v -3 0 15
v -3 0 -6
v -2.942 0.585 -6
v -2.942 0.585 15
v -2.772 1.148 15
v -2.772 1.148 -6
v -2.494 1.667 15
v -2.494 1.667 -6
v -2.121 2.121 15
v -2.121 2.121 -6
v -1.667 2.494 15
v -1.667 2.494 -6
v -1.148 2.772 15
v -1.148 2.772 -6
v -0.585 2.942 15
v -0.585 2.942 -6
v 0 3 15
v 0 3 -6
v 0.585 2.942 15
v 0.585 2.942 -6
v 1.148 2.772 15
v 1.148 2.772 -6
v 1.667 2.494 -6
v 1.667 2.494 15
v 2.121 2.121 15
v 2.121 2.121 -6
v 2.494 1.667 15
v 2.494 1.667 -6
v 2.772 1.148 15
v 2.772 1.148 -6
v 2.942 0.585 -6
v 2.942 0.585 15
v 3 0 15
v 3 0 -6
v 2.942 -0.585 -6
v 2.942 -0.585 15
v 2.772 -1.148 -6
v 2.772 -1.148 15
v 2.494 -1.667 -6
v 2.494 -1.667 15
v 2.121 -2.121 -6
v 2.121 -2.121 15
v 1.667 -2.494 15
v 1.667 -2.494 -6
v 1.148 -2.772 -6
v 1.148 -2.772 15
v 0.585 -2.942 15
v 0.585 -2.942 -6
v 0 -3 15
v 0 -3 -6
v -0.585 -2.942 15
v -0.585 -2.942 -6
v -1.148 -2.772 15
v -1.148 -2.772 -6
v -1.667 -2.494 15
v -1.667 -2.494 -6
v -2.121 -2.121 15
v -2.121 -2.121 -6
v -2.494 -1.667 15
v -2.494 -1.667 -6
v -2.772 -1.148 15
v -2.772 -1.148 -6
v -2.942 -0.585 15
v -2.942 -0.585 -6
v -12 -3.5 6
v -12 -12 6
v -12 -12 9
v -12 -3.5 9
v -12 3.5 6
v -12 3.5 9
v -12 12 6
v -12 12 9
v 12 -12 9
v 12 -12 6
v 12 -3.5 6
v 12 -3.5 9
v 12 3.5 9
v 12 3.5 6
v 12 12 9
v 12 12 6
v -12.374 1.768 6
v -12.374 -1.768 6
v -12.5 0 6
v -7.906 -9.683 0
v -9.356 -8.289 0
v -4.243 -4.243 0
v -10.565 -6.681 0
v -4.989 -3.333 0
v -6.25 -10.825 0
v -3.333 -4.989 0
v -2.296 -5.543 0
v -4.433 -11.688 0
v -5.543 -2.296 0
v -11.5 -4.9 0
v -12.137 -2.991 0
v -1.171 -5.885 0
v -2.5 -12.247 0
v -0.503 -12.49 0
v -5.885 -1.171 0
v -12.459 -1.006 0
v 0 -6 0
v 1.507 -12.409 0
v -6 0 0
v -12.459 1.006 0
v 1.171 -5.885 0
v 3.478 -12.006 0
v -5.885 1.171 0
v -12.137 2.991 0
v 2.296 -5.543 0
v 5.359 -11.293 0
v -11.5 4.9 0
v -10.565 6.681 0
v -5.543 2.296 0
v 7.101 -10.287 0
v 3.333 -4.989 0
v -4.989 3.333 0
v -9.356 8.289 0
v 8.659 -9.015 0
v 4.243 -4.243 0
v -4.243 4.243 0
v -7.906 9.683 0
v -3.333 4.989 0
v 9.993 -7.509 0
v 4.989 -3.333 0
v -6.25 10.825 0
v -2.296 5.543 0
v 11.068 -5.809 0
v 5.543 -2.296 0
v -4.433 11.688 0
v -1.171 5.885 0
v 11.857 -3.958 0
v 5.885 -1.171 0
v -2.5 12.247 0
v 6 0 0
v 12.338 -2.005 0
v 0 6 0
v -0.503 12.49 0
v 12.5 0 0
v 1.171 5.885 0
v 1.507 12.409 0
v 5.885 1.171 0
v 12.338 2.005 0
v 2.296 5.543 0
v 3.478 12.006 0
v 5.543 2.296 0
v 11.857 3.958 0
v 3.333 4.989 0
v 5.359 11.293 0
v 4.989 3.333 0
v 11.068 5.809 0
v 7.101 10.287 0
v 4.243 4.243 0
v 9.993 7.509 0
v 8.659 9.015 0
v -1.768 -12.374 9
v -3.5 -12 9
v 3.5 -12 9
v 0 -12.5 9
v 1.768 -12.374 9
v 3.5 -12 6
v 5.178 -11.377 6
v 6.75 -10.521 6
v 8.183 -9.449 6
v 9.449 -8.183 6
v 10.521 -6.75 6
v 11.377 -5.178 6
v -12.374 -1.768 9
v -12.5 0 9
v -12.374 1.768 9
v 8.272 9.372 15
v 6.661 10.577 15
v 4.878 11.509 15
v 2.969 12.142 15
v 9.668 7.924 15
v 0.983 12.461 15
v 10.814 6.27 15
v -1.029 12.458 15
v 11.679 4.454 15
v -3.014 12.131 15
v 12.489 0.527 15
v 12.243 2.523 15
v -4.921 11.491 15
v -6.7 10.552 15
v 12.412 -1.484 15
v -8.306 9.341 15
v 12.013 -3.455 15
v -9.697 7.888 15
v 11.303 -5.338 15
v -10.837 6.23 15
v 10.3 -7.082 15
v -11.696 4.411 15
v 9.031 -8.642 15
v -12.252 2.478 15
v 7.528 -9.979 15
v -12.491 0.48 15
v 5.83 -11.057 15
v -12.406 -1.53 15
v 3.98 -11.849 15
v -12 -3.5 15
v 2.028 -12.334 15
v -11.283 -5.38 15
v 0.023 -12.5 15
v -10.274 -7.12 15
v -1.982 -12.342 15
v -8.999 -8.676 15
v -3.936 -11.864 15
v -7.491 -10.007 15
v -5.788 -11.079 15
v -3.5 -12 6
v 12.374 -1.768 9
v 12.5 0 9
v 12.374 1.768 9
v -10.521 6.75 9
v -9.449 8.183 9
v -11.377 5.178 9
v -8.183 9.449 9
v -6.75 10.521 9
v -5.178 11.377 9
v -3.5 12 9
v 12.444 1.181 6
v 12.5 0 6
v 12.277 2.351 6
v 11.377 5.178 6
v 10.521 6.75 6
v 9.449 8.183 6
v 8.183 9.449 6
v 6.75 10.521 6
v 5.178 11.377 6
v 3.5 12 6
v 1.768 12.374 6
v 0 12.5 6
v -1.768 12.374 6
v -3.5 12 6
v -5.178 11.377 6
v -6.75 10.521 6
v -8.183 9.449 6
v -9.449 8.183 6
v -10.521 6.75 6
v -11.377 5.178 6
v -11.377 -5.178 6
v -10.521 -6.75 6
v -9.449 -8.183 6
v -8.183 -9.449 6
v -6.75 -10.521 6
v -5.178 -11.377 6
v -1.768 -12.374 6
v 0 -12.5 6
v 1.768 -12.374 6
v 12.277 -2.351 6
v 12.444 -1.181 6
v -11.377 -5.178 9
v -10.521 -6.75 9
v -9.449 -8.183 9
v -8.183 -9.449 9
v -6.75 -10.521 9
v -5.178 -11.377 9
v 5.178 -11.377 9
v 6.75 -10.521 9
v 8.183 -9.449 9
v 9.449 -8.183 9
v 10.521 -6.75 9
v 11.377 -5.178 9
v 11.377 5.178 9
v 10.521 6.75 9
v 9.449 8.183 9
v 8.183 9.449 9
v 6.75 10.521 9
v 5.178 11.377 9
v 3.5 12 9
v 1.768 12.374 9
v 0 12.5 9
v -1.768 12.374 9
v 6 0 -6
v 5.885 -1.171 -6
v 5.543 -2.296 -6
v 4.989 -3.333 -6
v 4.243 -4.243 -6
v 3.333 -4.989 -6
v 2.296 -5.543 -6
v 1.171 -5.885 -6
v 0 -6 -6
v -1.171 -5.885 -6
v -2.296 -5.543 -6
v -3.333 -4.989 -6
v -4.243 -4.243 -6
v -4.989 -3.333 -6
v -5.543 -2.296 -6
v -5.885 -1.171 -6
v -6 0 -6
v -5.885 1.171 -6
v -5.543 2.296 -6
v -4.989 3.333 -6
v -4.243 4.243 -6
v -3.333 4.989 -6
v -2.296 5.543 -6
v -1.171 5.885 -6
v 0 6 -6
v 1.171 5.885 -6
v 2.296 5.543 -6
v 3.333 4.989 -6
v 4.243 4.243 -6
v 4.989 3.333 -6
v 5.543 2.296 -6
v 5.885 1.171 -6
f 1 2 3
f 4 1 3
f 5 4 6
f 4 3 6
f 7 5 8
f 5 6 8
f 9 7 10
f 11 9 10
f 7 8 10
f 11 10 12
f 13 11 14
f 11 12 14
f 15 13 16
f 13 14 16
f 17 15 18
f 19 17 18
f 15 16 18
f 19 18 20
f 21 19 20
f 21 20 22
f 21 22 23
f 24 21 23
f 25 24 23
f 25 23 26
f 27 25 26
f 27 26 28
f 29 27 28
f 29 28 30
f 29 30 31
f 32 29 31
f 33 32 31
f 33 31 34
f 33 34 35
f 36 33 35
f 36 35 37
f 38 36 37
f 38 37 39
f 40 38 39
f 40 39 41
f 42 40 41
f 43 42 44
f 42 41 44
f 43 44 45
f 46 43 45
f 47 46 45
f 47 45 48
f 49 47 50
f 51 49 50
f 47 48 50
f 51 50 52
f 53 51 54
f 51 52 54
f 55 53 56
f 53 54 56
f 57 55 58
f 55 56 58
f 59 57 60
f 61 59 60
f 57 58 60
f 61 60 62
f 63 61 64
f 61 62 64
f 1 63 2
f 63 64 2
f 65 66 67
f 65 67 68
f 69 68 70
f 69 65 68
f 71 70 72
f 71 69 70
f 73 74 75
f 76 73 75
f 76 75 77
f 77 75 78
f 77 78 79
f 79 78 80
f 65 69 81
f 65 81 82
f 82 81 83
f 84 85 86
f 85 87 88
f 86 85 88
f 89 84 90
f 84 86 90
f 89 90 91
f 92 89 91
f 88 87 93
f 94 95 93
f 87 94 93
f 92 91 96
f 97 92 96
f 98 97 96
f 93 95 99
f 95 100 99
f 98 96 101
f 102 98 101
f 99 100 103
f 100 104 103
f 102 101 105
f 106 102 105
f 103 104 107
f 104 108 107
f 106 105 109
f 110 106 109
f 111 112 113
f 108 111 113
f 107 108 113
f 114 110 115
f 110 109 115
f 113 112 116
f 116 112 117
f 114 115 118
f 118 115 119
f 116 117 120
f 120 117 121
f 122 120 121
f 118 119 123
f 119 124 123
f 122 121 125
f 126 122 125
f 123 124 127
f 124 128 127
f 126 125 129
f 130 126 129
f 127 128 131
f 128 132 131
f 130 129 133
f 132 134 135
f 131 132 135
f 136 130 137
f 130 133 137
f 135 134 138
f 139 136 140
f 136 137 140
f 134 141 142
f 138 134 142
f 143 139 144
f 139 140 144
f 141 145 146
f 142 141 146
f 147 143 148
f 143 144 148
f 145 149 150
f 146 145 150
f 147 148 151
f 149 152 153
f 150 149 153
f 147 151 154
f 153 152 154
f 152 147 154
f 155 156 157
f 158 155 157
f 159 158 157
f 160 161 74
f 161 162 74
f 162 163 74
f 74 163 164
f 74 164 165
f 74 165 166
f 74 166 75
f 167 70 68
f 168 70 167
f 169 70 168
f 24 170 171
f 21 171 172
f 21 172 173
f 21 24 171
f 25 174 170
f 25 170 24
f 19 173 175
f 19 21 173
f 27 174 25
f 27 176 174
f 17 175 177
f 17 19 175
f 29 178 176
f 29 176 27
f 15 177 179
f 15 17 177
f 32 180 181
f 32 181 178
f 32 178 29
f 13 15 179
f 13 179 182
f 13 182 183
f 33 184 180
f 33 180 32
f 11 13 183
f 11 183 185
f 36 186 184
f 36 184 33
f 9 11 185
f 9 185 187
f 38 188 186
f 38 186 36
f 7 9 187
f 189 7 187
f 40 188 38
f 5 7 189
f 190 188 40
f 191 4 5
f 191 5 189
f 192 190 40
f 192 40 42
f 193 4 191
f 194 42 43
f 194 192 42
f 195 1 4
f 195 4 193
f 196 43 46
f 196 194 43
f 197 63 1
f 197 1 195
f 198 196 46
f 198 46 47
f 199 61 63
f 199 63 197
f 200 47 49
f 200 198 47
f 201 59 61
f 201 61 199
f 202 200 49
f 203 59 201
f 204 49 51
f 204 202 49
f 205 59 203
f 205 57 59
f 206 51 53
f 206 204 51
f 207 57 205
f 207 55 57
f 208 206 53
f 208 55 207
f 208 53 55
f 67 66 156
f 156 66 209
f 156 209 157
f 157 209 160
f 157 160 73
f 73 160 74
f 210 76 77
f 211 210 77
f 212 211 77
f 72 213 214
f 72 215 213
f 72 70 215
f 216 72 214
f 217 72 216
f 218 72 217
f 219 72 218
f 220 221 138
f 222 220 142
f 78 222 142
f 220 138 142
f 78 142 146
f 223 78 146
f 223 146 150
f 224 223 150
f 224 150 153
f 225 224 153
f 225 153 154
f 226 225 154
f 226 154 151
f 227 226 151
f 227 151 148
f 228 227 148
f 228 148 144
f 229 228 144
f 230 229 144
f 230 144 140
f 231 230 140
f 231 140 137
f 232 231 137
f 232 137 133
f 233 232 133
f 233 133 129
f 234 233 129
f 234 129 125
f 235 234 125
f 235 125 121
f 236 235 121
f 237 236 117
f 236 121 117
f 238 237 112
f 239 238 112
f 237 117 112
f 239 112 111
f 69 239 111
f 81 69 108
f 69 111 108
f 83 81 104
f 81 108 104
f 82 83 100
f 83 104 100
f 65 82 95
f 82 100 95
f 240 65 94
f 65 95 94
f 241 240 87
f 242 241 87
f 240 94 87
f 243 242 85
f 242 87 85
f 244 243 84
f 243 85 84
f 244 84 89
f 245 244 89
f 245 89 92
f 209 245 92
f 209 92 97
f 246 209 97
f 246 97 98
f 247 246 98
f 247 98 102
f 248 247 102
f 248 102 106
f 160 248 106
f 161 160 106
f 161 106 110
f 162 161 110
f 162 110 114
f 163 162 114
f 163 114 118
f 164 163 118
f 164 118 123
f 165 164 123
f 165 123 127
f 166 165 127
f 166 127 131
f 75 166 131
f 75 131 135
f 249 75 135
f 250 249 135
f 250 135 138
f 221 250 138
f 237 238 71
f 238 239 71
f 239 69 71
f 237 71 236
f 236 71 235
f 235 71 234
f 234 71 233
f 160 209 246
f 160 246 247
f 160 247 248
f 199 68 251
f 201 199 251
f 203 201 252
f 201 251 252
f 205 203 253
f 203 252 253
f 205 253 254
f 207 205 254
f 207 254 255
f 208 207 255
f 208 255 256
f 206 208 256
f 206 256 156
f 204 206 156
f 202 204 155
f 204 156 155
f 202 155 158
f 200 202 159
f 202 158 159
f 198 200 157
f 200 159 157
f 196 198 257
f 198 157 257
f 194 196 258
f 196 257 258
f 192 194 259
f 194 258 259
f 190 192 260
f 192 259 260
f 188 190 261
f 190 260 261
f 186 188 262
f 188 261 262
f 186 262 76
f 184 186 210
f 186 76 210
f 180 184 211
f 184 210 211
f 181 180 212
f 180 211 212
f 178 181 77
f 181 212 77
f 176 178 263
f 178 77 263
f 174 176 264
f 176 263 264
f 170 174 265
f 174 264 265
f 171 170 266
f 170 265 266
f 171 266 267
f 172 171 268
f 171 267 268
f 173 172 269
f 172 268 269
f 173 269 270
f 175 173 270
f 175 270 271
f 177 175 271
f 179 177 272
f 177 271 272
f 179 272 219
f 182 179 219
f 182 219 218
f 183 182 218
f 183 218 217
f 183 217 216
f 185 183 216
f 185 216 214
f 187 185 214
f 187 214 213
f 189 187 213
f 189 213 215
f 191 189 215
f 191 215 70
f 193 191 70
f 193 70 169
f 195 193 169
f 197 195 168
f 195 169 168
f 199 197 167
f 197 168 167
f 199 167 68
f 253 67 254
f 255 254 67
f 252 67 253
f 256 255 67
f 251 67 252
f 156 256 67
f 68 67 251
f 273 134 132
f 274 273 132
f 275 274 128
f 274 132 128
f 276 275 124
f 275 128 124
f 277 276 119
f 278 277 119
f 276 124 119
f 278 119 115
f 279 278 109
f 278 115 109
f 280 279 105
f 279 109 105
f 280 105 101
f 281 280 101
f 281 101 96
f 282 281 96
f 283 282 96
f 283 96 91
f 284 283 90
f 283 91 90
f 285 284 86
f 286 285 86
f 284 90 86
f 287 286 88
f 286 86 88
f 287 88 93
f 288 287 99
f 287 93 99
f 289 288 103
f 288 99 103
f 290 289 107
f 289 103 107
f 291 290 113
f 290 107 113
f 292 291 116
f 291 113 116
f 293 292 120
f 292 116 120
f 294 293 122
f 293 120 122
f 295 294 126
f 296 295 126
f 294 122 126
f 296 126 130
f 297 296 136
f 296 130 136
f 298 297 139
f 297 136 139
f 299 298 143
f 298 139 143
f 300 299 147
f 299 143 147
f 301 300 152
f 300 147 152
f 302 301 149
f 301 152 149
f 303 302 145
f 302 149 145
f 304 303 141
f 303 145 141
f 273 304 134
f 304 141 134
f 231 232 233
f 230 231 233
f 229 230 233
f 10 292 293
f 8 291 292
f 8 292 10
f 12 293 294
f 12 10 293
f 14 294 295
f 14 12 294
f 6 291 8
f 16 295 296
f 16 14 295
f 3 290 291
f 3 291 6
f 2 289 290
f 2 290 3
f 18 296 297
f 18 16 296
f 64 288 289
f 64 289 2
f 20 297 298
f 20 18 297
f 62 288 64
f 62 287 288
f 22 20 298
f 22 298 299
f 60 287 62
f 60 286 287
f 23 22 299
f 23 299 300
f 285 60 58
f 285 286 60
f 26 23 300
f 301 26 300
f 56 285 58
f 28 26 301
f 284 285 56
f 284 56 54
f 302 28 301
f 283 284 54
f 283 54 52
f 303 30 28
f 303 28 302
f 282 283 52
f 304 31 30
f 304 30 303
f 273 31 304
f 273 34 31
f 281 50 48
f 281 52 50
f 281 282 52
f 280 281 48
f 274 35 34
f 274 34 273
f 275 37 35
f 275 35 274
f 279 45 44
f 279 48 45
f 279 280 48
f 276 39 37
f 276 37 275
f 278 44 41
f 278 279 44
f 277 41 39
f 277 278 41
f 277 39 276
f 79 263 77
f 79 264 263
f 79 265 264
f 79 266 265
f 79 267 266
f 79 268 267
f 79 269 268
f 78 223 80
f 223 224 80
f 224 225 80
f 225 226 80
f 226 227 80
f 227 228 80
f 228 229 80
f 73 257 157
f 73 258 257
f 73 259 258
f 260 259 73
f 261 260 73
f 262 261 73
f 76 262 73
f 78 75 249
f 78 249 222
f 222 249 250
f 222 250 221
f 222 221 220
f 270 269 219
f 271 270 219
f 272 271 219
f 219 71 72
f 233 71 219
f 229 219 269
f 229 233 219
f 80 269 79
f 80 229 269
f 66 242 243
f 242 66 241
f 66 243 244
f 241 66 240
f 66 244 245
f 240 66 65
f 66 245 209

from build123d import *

# Parameters (mm, degrees)
SKETCH_1_R          = 12.5
EXTRUDE_1_DEPTH     = 6
SKETCH_2_R          = 6
EXTRUDE_2_DEPTH     = 6
SKETCH_3_W          = 24
SKETCH_3_H          = 24
EXTRUDE_3_DEPTH     = 3
SKETCH_4_R          = 12.5
EXTRUDE_4_DEPTH     = 6
SKETCH_937_R        = 3
CUT_EXTRUDE_1_DEPTH = 28.449954463


with BuildPart() as part:
    # Эскиз1 → Бобышка-Вытянуть1 (new body)
    with BuildSketch(Plane.XY):
        Circle(SKETCH_1_R)
    extrude(amount=EXTRUDE_1_DEPTH)

    # Эскиз2 → Бобышка-Вытянуть2 (add)
    with BuildSketch(Plane(origin=(0, 0, 0), x_dir=(-1, 0, 0), z_dir=(0, 0, -1))):
        with Locations(Location((0, 0, 0), (0, 0, 180))):
            Circle(SKETCH_2_R)
    extrude(amount=EXTRUDE_2_DEPTH)

    # Эскиз3 → Бобышка-Вытянуть3 (add)
    with BuildSketch(Plane.XY.offset(6)):
        Rectangle(SKETCH_3_W, SKETCH_3_H)
    extrude(amount=EXTRUDE_3_DEPTH)

    # Эскиз4 → Бобышка-Вытянуть4 (add)
    with BuildSketch(Plane.XY.offset(9)):
        with Locations(Location((0, 0, 0), (0, 0, 196.260204708))):
            Circle(SKETCH_4_R)
    extrude(amount=EXTRUDE_4_DEPTH)

    # Sketch 937 → Вырез-Вытянуть1 (cut, through all)
    with BuildSketch(Plane(origin=(0, 0, -6), x_dir=(-1, 0, 0), z_dir=(0, 0, -1))):
        Circle(SKETCH_937_R)
    extrude(amount=-CUT_EXTRUDE_1_DEPTH, mode=Mode.SUBTRACT)


solid = part.part
